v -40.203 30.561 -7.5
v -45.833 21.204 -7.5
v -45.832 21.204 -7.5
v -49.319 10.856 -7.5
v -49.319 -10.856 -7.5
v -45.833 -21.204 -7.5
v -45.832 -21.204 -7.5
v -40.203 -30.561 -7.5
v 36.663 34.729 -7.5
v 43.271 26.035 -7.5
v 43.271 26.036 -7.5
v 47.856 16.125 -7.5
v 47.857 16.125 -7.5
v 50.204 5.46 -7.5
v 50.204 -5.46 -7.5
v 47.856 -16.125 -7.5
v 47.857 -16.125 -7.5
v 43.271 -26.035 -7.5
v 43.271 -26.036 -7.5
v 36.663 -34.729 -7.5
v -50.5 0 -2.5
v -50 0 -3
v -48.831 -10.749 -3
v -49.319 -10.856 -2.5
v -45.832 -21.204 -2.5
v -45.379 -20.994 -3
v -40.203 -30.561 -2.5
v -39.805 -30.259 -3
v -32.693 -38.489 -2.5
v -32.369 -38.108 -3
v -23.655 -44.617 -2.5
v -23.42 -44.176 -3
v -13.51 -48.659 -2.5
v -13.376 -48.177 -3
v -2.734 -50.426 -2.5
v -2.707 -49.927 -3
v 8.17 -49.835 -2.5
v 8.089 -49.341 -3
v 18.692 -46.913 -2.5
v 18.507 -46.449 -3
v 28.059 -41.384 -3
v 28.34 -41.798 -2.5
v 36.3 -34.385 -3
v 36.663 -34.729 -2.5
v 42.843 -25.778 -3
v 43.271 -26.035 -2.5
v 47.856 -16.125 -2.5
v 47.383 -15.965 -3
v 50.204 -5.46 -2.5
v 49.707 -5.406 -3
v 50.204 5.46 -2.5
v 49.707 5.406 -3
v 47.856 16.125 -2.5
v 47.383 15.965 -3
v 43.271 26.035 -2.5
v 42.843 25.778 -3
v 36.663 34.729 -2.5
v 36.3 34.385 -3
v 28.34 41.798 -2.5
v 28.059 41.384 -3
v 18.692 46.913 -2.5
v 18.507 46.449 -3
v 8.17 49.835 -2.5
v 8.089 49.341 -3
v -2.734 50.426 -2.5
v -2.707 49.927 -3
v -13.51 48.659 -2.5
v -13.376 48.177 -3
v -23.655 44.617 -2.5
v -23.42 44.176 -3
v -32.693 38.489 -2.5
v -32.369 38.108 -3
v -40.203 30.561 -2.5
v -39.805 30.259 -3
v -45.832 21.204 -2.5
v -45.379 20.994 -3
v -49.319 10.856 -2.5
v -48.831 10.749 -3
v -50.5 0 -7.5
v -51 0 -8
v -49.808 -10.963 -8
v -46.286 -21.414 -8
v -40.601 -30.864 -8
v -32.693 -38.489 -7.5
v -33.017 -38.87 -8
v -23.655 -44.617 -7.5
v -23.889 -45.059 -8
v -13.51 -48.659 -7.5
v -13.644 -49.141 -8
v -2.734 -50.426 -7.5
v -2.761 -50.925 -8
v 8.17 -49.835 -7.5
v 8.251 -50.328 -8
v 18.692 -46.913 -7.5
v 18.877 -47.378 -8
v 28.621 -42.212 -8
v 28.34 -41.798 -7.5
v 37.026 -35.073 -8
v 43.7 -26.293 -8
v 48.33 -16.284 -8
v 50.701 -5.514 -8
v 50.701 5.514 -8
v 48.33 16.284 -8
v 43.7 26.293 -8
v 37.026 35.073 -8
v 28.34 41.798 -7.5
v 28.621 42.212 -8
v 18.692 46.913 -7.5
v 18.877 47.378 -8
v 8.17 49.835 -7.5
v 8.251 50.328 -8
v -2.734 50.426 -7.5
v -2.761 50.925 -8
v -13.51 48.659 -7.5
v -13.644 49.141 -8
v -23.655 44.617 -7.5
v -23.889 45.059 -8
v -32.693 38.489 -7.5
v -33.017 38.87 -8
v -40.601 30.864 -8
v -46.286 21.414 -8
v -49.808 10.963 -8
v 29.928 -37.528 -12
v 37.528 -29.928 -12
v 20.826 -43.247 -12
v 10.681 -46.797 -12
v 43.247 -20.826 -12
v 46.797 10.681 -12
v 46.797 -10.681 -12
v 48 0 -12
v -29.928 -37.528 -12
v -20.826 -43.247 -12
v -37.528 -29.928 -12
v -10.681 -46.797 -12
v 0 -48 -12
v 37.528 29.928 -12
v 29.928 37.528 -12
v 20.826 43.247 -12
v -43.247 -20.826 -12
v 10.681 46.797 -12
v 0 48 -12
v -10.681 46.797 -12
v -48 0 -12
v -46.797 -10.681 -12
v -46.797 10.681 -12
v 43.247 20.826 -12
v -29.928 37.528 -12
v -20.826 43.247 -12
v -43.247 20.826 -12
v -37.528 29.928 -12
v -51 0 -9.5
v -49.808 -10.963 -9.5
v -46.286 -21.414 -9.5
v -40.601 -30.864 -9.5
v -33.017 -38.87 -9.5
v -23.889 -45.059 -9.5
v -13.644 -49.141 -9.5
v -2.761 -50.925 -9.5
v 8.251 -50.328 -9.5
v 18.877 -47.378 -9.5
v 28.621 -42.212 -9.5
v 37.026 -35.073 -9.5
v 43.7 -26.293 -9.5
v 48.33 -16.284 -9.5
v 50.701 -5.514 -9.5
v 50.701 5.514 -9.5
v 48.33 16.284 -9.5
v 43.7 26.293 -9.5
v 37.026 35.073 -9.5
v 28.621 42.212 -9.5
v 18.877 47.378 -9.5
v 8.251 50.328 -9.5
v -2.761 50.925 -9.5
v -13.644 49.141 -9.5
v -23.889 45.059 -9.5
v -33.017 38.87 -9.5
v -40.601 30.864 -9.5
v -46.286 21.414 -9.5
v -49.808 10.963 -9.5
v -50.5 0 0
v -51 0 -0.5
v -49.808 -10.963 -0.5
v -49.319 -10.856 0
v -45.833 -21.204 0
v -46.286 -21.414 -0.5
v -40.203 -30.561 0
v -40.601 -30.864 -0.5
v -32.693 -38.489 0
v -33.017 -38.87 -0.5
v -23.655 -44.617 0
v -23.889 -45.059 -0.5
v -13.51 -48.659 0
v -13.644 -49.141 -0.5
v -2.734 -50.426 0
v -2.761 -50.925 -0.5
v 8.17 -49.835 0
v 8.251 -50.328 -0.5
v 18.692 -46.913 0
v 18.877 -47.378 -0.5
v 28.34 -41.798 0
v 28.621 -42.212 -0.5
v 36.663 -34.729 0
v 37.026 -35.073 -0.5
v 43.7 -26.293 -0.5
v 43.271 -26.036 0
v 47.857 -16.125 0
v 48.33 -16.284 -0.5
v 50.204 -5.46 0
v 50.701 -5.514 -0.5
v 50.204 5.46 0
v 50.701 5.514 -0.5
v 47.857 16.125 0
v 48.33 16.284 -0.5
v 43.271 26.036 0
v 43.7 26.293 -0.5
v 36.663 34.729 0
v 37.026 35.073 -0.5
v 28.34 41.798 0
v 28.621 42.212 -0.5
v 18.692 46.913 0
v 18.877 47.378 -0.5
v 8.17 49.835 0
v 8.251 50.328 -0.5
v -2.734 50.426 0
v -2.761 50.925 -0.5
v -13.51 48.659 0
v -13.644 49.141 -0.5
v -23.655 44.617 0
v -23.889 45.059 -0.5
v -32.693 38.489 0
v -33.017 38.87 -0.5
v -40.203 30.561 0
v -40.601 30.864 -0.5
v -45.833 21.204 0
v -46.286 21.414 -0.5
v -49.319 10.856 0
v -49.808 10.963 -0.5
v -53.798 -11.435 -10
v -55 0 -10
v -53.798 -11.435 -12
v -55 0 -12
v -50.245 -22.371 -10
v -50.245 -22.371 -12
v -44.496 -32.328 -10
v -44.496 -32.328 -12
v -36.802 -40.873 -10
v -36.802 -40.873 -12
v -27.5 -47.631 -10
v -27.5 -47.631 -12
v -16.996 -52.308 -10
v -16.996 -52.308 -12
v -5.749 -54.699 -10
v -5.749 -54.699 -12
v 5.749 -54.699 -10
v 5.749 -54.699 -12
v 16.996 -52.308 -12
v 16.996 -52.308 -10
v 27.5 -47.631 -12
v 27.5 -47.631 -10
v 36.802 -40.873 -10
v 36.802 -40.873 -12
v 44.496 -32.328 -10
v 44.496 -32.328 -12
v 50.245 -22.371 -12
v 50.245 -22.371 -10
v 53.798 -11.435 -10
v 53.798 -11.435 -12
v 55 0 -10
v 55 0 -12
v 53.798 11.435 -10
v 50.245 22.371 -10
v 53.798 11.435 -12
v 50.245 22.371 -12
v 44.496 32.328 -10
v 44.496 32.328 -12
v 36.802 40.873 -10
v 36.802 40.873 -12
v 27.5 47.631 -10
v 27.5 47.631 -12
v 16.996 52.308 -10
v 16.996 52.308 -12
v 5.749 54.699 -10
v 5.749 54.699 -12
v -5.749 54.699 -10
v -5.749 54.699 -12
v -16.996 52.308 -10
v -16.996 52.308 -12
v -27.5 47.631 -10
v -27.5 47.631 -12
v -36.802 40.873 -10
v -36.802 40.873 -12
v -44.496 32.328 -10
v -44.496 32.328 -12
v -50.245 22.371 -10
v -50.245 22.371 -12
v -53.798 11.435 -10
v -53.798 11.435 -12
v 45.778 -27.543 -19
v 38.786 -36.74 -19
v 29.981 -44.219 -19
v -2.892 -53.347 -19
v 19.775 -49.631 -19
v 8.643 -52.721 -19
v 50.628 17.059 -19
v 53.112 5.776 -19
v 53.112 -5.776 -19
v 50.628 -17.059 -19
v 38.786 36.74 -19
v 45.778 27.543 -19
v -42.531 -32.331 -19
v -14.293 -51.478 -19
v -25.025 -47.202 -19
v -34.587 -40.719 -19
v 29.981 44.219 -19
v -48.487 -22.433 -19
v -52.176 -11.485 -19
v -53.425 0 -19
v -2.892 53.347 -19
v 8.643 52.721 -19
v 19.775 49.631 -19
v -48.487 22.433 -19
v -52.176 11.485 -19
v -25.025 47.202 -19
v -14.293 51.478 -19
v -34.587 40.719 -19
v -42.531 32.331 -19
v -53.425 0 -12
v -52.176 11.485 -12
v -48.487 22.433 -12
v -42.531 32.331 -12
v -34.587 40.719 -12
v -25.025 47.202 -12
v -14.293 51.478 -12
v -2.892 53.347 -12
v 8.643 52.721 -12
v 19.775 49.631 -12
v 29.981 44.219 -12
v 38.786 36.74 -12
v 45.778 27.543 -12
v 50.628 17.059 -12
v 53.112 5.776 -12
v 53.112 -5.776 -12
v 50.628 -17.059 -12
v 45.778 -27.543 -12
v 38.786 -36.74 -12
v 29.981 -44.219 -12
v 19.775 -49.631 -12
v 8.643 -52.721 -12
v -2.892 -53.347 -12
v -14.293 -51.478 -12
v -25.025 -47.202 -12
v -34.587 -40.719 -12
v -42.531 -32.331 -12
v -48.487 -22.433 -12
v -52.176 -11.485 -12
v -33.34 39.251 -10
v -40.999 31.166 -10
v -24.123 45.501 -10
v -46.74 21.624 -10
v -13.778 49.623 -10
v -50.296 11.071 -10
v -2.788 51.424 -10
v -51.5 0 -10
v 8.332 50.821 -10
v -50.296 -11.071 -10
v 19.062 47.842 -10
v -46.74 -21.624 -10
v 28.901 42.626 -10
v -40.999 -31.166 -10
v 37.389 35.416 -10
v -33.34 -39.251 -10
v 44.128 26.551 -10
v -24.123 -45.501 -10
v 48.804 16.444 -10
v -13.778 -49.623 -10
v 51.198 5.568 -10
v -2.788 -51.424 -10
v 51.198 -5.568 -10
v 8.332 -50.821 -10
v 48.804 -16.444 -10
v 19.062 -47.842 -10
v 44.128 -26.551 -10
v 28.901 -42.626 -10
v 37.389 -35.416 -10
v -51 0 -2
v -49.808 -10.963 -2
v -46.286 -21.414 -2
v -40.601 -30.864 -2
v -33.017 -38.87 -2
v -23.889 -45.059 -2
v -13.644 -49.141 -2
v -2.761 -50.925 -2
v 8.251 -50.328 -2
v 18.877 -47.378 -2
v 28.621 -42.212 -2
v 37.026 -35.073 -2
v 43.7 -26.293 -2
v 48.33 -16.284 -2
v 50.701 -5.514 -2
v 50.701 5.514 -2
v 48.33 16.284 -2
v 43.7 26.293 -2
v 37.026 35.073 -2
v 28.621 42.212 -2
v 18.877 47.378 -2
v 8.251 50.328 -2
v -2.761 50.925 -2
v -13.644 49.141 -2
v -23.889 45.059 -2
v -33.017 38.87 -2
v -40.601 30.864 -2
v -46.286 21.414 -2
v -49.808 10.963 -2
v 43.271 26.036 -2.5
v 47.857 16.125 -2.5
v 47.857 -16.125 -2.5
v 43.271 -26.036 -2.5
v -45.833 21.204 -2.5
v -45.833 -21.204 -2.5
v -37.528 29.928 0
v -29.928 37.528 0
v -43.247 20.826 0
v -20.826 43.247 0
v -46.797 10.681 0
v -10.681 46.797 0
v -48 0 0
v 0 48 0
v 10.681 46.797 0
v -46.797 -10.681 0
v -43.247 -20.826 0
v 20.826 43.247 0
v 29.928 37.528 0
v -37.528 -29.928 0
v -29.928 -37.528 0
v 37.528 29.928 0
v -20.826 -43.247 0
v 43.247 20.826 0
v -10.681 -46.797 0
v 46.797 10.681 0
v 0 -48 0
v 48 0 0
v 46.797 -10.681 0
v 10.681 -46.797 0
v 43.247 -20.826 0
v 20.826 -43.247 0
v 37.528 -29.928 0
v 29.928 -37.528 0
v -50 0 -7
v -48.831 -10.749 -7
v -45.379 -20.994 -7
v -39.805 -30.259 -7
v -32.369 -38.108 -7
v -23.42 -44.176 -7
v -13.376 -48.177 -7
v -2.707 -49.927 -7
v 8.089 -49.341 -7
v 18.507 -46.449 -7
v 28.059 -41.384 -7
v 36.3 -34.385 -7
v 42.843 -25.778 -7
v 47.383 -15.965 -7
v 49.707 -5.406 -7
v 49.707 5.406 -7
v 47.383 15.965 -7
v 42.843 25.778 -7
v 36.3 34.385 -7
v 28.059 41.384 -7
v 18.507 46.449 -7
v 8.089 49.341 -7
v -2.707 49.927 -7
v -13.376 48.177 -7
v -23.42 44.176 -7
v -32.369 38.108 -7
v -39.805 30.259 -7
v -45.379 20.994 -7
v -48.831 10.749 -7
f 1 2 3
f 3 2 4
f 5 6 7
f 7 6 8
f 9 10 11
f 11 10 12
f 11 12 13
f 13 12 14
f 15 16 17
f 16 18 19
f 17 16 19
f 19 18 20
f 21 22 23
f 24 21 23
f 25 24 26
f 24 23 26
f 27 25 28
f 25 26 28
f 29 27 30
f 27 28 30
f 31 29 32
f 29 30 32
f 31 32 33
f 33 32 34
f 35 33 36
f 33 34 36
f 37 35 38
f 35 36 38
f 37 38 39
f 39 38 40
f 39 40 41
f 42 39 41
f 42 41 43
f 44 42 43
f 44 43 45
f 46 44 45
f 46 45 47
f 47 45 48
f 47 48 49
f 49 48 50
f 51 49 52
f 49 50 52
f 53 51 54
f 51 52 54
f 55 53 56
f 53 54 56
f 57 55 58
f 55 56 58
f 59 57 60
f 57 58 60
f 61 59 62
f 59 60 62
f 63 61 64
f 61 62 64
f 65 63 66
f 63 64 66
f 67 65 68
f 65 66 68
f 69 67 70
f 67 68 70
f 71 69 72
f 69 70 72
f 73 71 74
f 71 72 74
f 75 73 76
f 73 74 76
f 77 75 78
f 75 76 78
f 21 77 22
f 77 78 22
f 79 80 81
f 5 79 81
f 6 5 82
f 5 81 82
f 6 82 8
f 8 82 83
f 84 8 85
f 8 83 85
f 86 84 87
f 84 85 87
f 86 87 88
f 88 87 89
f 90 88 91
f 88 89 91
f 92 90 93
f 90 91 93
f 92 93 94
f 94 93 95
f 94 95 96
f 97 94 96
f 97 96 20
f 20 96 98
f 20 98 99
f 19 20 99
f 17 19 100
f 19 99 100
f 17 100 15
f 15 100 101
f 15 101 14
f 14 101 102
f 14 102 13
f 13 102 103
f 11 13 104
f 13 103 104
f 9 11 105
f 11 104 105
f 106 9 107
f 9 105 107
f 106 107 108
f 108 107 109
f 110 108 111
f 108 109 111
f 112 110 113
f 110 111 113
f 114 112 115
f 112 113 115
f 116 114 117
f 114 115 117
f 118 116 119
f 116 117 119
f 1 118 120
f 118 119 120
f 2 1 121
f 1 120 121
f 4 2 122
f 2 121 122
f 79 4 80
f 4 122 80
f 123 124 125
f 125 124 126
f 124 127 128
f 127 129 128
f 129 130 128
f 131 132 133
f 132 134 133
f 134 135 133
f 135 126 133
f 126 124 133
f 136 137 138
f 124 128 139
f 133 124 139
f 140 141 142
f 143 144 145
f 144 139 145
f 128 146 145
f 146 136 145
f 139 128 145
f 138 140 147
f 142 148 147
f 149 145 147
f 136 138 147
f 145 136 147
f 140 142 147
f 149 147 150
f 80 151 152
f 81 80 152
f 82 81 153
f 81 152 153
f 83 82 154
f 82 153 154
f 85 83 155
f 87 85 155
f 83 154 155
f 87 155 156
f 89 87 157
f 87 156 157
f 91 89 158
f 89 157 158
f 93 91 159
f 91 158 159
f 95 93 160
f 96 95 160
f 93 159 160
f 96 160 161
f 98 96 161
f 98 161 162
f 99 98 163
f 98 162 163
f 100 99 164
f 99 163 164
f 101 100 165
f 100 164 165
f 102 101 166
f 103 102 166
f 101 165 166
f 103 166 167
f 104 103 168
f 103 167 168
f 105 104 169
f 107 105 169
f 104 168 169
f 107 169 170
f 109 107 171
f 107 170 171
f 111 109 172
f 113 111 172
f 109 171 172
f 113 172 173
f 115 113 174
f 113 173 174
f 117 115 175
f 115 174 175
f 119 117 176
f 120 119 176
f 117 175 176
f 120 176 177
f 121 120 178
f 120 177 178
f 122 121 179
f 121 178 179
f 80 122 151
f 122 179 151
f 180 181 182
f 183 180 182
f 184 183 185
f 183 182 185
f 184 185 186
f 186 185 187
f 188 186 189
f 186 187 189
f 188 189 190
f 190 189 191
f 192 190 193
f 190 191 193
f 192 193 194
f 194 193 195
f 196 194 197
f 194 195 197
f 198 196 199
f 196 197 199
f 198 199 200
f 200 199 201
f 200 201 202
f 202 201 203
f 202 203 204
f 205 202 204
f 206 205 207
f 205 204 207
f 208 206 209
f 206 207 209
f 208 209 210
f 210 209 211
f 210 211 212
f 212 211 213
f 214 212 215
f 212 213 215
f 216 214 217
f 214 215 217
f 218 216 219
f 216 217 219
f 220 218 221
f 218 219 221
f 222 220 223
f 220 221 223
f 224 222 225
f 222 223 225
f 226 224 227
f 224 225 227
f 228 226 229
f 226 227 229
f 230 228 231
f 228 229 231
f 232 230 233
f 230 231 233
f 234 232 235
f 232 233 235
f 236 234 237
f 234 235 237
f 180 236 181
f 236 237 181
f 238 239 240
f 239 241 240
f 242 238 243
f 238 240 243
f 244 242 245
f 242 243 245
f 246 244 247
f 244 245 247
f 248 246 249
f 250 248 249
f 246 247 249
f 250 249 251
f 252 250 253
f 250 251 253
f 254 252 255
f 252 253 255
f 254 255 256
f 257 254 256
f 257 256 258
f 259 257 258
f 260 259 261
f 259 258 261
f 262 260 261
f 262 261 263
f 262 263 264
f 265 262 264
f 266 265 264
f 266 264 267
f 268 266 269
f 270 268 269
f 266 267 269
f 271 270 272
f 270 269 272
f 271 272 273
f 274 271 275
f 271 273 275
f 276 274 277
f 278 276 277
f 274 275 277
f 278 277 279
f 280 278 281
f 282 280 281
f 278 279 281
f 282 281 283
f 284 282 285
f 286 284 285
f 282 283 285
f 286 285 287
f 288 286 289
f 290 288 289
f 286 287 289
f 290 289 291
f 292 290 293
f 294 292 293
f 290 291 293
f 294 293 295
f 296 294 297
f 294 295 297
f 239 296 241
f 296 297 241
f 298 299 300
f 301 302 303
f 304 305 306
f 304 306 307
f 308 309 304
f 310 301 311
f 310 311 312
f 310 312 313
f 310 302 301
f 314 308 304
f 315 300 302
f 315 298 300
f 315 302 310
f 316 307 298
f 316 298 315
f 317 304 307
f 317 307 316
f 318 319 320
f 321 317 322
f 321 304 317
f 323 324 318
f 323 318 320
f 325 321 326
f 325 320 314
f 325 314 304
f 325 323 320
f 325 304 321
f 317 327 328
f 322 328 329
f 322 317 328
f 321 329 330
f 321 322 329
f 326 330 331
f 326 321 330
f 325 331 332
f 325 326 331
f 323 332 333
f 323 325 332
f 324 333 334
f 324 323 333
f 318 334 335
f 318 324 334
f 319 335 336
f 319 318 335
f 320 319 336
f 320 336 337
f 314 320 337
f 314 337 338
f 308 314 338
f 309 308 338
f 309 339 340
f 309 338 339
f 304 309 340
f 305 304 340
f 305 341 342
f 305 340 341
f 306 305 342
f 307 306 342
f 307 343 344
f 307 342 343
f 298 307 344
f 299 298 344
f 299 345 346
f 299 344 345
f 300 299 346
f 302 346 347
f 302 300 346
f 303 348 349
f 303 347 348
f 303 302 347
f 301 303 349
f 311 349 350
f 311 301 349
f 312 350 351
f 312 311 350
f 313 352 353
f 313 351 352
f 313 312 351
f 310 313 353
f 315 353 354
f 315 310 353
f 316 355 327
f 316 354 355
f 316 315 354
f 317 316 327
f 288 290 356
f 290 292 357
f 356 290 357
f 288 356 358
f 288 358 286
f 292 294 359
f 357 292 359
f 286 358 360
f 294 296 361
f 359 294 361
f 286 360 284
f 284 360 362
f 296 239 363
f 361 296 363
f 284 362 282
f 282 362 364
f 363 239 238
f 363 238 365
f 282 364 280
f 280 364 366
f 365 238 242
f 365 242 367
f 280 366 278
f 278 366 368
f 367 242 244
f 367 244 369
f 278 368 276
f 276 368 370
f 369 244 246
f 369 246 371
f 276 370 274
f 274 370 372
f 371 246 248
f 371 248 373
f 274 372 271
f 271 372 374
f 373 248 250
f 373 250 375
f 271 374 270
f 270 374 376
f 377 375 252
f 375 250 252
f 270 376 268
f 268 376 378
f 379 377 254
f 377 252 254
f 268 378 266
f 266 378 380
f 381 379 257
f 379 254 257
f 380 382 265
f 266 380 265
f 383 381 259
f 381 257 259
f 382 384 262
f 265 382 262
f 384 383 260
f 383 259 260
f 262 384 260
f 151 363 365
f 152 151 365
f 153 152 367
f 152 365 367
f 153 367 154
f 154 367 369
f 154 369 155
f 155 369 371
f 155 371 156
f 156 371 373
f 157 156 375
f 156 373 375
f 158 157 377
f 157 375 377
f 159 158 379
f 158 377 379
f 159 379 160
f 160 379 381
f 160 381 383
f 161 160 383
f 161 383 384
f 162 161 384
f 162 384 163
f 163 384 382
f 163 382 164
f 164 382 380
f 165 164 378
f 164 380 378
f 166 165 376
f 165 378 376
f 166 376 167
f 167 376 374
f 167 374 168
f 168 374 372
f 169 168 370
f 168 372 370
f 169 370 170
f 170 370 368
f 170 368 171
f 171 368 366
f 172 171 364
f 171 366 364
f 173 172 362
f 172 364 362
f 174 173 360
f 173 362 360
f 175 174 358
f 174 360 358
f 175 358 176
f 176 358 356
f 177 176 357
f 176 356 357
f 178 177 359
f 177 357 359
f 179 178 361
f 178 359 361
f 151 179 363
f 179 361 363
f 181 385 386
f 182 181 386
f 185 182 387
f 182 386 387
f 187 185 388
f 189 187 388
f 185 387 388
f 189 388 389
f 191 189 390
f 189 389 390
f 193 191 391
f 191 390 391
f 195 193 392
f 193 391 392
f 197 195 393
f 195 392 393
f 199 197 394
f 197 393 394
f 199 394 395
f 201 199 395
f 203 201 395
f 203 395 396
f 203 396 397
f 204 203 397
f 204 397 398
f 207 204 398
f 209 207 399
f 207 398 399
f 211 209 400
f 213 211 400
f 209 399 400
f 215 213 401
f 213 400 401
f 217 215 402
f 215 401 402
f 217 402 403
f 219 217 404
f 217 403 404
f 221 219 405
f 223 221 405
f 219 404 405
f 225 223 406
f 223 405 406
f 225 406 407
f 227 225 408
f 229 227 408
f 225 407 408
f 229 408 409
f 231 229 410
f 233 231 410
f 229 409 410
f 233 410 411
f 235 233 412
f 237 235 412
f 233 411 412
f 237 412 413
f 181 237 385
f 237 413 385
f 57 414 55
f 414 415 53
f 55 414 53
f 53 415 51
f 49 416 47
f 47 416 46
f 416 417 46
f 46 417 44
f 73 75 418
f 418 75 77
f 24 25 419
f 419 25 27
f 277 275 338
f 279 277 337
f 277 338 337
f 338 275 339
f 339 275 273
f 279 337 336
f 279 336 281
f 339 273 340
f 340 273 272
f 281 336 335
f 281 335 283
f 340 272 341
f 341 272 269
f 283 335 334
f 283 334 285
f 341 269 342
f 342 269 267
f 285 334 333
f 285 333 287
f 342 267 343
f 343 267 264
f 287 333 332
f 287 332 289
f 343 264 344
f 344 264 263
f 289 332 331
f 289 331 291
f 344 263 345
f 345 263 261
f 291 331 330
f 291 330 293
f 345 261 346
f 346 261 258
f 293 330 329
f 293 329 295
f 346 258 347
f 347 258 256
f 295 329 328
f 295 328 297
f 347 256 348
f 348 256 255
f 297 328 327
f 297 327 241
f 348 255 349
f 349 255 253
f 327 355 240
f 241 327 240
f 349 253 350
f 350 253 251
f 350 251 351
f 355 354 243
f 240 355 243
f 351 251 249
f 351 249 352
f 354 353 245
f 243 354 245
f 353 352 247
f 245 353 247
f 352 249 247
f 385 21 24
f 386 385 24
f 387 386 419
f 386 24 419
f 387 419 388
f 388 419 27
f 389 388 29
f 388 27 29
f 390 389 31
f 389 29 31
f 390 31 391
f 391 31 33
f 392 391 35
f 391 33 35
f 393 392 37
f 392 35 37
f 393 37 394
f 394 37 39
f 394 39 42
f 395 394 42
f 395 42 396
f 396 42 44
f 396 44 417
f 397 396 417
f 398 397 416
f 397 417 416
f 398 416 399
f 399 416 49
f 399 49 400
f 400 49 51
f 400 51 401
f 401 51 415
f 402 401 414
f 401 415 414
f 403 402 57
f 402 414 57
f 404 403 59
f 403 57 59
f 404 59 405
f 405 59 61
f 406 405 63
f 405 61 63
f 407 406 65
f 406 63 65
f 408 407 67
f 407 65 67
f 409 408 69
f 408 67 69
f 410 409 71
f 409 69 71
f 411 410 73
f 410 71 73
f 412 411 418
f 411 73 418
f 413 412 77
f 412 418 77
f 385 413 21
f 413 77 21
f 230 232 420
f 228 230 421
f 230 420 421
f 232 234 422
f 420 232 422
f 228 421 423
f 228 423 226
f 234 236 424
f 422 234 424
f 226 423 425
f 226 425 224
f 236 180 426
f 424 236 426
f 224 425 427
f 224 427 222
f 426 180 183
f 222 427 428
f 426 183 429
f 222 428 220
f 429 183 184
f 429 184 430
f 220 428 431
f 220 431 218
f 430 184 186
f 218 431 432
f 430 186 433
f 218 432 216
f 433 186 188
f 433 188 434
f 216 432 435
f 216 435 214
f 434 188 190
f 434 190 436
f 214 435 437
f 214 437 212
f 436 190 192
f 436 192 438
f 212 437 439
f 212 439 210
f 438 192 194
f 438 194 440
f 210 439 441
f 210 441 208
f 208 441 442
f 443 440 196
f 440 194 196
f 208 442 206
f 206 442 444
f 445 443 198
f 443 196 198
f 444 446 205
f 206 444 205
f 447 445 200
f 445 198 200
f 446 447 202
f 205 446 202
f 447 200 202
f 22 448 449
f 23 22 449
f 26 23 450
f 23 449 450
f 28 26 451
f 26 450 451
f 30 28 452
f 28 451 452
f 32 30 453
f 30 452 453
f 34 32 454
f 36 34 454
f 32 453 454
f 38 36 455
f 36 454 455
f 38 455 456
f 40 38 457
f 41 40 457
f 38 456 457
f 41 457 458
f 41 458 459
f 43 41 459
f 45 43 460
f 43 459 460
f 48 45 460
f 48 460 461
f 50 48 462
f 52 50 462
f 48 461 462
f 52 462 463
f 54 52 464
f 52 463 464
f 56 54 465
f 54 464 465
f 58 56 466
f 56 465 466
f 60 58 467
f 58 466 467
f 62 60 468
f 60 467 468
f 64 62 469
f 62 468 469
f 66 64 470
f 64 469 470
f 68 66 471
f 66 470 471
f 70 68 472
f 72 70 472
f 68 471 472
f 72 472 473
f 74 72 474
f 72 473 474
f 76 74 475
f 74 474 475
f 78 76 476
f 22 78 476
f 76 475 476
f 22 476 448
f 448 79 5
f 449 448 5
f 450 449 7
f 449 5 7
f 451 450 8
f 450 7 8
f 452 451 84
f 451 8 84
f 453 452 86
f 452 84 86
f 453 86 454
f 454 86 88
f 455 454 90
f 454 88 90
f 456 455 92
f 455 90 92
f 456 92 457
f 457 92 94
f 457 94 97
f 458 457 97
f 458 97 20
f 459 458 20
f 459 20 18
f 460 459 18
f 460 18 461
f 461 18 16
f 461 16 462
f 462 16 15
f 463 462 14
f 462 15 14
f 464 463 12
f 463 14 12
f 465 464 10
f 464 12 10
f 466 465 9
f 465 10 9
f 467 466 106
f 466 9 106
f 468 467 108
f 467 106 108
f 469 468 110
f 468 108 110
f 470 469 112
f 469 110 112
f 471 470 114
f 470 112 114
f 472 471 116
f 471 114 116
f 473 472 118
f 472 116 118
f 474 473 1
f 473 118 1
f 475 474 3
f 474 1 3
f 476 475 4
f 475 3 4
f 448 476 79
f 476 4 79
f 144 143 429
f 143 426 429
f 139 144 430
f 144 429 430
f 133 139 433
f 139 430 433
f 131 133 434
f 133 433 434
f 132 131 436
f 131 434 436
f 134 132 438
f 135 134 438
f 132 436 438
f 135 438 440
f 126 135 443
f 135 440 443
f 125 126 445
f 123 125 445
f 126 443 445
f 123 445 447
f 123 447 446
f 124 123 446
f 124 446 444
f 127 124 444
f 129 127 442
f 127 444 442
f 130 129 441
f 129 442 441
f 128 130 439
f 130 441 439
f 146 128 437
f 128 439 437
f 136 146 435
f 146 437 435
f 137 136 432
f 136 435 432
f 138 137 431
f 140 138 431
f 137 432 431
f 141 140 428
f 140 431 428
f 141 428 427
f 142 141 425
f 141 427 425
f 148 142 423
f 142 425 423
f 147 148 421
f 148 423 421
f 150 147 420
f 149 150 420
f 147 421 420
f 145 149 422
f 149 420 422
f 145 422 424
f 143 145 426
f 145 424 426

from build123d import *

# Parameters (mm, degrees)
CHAMFER1_SIZE       = 0.5
BOSS_EXTRUDE1_START = 7
SKETCH2_R           = 53.425
BOSS_EXTRUDE1_DEPTH = 7


with BuildPart() as part:
    # Sketch1 → Revolve1 (revolve)
    with BuildSketch(Plane(origin=(0, 0, 0), x_dir=(1, 0, 0), z_dir=(0, 1, 0)), mode=Mode.PRIVATE) as revolve1_sk:
        Polygon((50.425, 19), (50.425, 14), (48, 14), (48, 0), (51, 0), (51, 2.5), (50, 2.5), (50, 7.5), (51, 7.5), (51, 10), (55, 10), (55, 12), (53.425, 12), (53.425, 19), align=None)
    revolve(revolve1_sk.sketch.rotate(Axis((0, 0, -69.169847328), (0, 0, 1)), 180), axis=Axis((0, 0, -69.169847328), (0, 0, 1)))

    # Chamfer1
    chamfer1_edges = [part.edges().sort_by_distance(p)[0] for p in [
        (51, 0, -10),
        (51, 0, -7.5),
        (50, 0, -7.5),
        (50, 0, -2.5),
        (51, 0, -2.5),
        (51, 0, 0),
        (50.425, 0, -19),
        (53.425, 0, -19),
    ]]
    chamfer(chamfer1_edges, length=CHAMFER1_SIZE - 0.0001)  # a hair under: the kernel refuses the full size

    # Sketch2 → Boss-Extrude1 (add)
    with BuildSketch(Plane(origin=(0, 0, -12), x_dir=(-1, 0, 0), z_dir=(0, 0, -1)).offset(BOSS_EXTRUDE1_START)):
        Circle(SKETCH2_R)
    extrude(amount=-BOSS_EXTRUDE1_DEPTH)


solid = part.part
